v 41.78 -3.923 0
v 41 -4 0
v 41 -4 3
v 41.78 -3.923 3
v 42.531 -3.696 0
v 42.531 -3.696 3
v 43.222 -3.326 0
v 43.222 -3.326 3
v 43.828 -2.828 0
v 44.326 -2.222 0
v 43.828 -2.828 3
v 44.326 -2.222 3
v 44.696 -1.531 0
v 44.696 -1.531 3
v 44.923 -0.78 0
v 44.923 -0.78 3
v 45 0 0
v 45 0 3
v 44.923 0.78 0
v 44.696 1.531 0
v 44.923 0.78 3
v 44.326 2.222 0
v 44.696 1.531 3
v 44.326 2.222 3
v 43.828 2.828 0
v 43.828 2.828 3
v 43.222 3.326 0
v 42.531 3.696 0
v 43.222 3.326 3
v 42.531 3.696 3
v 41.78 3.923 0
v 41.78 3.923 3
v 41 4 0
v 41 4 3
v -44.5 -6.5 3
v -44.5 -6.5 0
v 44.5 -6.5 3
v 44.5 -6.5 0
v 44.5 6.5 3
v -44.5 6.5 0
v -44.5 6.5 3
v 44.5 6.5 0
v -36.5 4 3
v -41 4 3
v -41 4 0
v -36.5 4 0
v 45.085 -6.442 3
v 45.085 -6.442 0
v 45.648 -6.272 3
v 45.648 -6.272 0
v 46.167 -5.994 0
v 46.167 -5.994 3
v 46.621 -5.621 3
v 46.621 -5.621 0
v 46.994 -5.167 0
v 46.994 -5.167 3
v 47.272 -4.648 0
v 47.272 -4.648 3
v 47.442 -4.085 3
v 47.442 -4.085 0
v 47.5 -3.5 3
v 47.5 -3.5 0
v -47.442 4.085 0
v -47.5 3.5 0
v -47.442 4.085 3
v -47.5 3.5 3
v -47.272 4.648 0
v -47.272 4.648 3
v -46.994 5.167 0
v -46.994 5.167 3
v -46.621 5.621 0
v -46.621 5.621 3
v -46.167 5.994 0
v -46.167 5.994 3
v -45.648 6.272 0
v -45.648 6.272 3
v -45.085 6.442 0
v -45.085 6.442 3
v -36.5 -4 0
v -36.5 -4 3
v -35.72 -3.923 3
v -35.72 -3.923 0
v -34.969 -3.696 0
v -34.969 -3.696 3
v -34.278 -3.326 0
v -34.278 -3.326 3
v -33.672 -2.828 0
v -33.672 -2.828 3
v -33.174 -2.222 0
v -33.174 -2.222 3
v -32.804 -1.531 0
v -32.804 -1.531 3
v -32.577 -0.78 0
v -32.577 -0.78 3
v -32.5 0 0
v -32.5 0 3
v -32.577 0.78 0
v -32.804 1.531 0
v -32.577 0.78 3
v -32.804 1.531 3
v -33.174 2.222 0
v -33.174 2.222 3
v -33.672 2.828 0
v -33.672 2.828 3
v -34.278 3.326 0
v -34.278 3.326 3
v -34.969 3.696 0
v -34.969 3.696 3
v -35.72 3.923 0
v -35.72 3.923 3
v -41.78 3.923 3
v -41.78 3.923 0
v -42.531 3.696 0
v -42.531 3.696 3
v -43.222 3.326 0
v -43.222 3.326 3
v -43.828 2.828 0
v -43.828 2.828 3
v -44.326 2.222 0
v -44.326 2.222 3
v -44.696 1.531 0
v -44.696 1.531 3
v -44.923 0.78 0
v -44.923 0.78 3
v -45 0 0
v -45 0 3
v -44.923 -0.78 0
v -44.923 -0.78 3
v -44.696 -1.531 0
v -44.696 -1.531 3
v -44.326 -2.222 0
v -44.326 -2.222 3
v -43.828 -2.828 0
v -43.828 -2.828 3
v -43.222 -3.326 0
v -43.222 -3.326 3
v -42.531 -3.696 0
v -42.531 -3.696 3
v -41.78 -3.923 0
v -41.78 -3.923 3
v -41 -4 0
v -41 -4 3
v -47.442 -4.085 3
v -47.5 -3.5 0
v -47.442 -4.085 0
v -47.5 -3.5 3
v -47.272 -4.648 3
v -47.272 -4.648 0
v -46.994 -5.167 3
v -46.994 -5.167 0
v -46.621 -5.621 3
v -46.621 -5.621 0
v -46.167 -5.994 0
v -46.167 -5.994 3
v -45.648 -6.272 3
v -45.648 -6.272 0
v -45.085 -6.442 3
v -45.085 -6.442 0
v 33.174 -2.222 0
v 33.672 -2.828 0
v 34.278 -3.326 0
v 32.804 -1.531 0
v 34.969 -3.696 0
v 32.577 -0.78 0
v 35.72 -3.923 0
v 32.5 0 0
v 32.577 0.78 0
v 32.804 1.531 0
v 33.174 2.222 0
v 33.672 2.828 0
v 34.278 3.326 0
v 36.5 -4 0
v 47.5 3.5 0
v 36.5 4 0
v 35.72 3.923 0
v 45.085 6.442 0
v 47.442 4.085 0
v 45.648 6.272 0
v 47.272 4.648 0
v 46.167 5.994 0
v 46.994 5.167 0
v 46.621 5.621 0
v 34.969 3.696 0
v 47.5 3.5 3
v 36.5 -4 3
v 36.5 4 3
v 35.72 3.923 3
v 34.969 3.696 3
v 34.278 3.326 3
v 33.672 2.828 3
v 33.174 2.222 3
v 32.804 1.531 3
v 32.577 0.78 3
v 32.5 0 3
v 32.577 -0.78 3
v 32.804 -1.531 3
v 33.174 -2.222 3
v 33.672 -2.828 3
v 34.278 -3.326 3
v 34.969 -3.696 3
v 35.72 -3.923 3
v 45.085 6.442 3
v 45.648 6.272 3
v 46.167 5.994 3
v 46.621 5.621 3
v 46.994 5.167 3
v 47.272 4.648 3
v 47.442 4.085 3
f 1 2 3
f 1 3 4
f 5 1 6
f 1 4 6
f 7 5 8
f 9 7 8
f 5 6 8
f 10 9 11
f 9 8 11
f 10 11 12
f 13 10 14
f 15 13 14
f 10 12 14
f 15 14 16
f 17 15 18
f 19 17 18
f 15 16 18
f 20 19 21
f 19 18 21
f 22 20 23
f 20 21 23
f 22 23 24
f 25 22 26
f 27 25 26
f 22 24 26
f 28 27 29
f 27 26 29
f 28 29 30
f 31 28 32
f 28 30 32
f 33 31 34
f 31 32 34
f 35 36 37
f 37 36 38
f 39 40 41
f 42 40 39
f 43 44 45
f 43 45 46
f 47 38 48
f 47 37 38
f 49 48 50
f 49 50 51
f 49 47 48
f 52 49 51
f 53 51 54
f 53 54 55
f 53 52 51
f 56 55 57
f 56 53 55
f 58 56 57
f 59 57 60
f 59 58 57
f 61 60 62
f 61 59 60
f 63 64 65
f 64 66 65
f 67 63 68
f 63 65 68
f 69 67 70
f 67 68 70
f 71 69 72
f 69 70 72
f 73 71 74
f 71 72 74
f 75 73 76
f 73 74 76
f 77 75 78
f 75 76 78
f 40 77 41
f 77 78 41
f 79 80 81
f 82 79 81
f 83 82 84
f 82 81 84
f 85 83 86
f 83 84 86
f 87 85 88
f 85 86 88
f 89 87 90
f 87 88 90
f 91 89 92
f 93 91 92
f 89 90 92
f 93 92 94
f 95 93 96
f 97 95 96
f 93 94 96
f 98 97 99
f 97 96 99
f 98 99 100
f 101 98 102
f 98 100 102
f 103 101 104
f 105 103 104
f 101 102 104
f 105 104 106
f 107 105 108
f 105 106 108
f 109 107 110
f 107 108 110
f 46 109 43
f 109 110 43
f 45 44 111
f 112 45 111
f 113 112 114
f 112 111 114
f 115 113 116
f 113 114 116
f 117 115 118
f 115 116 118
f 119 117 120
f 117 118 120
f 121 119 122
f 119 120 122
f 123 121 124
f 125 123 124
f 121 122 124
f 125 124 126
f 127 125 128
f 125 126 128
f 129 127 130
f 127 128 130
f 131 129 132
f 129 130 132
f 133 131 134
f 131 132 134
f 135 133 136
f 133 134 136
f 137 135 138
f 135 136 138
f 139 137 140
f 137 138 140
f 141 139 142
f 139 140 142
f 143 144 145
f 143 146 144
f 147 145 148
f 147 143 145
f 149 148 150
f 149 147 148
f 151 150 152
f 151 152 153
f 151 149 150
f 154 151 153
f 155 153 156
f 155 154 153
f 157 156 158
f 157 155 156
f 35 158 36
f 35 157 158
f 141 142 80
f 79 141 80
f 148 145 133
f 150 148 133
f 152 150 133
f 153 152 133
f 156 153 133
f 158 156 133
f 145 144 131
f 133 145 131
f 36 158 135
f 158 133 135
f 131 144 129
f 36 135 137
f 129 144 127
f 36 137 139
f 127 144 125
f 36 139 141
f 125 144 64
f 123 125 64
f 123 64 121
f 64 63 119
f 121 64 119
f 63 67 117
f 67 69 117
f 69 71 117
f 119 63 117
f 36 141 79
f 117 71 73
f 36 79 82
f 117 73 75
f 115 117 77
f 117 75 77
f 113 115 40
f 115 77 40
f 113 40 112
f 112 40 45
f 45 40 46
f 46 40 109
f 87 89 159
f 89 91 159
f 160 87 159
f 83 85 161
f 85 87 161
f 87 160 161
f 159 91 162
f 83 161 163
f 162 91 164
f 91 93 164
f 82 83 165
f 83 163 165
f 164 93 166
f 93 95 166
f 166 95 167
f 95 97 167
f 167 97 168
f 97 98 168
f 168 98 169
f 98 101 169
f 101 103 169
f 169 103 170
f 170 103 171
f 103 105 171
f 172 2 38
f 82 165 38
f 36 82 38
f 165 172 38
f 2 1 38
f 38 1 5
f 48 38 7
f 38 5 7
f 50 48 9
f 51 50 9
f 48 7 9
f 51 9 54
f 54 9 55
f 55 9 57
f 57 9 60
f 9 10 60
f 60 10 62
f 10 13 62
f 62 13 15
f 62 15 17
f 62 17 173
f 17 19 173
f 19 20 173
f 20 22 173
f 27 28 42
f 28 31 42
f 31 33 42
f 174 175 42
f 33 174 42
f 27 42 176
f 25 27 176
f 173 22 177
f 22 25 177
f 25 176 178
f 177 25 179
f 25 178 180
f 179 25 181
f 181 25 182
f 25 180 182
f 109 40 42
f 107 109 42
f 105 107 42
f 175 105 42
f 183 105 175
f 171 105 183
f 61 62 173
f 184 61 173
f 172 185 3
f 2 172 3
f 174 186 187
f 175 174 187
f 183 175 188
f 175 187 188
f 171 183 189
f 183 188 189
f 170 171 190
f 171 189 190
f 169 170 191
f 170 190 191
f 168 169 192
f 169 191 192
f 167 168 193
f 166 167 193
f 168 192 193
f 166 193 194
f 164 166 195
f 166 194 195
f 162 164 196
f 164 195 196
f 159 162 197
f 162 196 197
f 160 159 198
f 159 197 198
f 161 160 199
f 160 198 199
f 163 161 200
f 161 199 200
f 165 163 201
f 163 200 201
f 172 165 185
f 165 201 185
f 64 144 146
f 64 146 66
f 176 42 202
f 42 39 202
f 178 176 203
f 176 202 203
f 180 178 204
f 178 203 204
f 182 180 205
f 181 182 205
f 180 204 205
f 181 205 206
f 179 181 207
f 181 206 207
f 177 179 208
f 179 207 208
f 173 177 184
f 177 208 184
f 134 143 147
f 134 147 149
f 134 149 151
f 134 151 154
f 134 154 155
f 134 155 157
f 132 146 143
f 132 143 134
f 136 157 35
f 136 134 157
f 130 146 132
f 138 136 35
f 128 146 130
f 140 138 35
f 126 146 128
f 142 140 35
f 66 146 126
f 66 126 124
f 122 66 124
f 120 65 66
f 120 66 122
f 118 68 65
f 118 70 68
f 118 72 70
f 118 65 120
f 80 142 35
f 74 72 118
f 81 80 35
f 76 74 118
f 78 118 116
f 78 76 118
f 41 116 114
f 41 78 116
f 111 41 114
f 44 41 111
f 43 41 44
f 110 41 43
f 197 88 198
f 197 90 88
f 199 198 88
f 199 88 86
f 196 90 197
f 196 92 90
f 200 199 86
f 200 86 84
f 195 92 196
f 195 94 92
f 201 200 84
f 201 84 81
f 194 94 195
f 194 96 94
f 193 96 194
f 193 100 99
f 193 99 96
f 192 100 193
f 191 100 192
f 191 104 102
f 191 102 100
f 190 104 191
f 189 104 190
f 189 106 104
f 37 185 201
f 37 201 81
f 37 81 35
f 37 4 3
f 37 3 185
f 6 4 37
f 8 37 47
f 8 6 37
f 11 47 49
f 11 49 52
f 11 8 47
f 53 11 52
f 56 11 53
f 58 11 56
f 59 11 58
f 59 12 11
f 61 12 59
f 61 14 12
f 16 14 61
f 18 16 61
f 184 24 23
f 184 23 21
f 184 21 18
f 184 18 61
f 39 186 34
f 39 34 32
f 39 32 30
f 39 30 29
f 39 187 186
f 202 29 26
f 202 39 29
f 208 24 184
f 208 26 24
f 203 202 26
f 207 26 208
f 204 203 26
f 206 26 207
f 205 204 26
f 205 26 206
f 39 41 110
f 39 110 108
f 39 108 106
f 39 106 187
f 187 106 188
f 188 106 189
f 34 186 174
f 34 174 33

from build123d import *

# Parameters (mm, degrees)
SKETCH_1_W          = 95
SKETCH_1_H          = 13
EXTRUDE_1_DEPTH     = 3
SKETCH_2_R          = 4
CUT_EXTRUDE_1_DEPTH = 3
FILLET_1_R          = 3
SKETCH_3_R          = 4
CUT_EXTRUDE_2_DEPTH = 3
SKETCH_4_W          = 4.5
SKETCH_4_H          = 8
CUT_EXTRUDE_3_DEPTH = 3


with BuildPart() as part:
    # ｽｹｯﾁ1 → ﾎﾞｽ - 押し出し1 (new body)
    with BuildSketch(Plane.XY):
        Rectangle(SKETCH_1_W, SKETCH_1_H)
    extrude(amount=EXTRUDE_1_DEPTH)

    # ｽｹｯﾁ2 → ｶｯﾄ - 押し出し1 (cut)
    with BuildSketch(Plane.XY.offset(3)):
        with Locations((41, 0)):
            Circle(SKETCH_2_R)
        with Locations((-41, 0)):
            Circle(SKETCH_2_R)
    extrude(amount=-CUT_EXTRUDE_1_DEPTH, mode=Mode.SUBTRACT)

    # ﾌｨﾚｯﾄ1
    fillet_1_edges = [part.edges().sort_by_distance(p)[0] for p in [
        (47.5, -6.5, 1.5),
        (-47.5, -6.5, 1.5),
        (-47.5, 6.5, 1.5),
        (47.5, 6.5, 1.5),
    ]]
    fillet(fillet_1_edges, radius=FILLET_1_R)

    # ｽｹｯﾁ3 → ｶｯﾄ - 押し出し2 (cut)
    with BuildSketch(Plane.XY.offset(3)):
        with Locations((36.5, 0)):
            Circle(SKETCH_3_R)
        with Locations((-36.5, 0)):
            Circle(SKETCH_3_R)
    extrude(amount=-CUT_EXTRUDE_2_DEPTH, mode=Mode.SUBTRACT)

    # ｽｹｯﾁ4 → ｶｯﾄ - 押し出し3 (cut)
    with BuildSketch(Plane.XY.offset(3)):
        with Locations((-38.75, 0)):
            Rectangle(SKETCH_4_W, SKETCH_4_H)
        with Locations((38.75, 0)):
            Rectangle(SKETCH_4_W, SKETCH_4_H)
    extrude(amount=-CUT_EXTRUDE_3_DEPTH, mode=Mode.SUBTRACT)


solid = part.part
